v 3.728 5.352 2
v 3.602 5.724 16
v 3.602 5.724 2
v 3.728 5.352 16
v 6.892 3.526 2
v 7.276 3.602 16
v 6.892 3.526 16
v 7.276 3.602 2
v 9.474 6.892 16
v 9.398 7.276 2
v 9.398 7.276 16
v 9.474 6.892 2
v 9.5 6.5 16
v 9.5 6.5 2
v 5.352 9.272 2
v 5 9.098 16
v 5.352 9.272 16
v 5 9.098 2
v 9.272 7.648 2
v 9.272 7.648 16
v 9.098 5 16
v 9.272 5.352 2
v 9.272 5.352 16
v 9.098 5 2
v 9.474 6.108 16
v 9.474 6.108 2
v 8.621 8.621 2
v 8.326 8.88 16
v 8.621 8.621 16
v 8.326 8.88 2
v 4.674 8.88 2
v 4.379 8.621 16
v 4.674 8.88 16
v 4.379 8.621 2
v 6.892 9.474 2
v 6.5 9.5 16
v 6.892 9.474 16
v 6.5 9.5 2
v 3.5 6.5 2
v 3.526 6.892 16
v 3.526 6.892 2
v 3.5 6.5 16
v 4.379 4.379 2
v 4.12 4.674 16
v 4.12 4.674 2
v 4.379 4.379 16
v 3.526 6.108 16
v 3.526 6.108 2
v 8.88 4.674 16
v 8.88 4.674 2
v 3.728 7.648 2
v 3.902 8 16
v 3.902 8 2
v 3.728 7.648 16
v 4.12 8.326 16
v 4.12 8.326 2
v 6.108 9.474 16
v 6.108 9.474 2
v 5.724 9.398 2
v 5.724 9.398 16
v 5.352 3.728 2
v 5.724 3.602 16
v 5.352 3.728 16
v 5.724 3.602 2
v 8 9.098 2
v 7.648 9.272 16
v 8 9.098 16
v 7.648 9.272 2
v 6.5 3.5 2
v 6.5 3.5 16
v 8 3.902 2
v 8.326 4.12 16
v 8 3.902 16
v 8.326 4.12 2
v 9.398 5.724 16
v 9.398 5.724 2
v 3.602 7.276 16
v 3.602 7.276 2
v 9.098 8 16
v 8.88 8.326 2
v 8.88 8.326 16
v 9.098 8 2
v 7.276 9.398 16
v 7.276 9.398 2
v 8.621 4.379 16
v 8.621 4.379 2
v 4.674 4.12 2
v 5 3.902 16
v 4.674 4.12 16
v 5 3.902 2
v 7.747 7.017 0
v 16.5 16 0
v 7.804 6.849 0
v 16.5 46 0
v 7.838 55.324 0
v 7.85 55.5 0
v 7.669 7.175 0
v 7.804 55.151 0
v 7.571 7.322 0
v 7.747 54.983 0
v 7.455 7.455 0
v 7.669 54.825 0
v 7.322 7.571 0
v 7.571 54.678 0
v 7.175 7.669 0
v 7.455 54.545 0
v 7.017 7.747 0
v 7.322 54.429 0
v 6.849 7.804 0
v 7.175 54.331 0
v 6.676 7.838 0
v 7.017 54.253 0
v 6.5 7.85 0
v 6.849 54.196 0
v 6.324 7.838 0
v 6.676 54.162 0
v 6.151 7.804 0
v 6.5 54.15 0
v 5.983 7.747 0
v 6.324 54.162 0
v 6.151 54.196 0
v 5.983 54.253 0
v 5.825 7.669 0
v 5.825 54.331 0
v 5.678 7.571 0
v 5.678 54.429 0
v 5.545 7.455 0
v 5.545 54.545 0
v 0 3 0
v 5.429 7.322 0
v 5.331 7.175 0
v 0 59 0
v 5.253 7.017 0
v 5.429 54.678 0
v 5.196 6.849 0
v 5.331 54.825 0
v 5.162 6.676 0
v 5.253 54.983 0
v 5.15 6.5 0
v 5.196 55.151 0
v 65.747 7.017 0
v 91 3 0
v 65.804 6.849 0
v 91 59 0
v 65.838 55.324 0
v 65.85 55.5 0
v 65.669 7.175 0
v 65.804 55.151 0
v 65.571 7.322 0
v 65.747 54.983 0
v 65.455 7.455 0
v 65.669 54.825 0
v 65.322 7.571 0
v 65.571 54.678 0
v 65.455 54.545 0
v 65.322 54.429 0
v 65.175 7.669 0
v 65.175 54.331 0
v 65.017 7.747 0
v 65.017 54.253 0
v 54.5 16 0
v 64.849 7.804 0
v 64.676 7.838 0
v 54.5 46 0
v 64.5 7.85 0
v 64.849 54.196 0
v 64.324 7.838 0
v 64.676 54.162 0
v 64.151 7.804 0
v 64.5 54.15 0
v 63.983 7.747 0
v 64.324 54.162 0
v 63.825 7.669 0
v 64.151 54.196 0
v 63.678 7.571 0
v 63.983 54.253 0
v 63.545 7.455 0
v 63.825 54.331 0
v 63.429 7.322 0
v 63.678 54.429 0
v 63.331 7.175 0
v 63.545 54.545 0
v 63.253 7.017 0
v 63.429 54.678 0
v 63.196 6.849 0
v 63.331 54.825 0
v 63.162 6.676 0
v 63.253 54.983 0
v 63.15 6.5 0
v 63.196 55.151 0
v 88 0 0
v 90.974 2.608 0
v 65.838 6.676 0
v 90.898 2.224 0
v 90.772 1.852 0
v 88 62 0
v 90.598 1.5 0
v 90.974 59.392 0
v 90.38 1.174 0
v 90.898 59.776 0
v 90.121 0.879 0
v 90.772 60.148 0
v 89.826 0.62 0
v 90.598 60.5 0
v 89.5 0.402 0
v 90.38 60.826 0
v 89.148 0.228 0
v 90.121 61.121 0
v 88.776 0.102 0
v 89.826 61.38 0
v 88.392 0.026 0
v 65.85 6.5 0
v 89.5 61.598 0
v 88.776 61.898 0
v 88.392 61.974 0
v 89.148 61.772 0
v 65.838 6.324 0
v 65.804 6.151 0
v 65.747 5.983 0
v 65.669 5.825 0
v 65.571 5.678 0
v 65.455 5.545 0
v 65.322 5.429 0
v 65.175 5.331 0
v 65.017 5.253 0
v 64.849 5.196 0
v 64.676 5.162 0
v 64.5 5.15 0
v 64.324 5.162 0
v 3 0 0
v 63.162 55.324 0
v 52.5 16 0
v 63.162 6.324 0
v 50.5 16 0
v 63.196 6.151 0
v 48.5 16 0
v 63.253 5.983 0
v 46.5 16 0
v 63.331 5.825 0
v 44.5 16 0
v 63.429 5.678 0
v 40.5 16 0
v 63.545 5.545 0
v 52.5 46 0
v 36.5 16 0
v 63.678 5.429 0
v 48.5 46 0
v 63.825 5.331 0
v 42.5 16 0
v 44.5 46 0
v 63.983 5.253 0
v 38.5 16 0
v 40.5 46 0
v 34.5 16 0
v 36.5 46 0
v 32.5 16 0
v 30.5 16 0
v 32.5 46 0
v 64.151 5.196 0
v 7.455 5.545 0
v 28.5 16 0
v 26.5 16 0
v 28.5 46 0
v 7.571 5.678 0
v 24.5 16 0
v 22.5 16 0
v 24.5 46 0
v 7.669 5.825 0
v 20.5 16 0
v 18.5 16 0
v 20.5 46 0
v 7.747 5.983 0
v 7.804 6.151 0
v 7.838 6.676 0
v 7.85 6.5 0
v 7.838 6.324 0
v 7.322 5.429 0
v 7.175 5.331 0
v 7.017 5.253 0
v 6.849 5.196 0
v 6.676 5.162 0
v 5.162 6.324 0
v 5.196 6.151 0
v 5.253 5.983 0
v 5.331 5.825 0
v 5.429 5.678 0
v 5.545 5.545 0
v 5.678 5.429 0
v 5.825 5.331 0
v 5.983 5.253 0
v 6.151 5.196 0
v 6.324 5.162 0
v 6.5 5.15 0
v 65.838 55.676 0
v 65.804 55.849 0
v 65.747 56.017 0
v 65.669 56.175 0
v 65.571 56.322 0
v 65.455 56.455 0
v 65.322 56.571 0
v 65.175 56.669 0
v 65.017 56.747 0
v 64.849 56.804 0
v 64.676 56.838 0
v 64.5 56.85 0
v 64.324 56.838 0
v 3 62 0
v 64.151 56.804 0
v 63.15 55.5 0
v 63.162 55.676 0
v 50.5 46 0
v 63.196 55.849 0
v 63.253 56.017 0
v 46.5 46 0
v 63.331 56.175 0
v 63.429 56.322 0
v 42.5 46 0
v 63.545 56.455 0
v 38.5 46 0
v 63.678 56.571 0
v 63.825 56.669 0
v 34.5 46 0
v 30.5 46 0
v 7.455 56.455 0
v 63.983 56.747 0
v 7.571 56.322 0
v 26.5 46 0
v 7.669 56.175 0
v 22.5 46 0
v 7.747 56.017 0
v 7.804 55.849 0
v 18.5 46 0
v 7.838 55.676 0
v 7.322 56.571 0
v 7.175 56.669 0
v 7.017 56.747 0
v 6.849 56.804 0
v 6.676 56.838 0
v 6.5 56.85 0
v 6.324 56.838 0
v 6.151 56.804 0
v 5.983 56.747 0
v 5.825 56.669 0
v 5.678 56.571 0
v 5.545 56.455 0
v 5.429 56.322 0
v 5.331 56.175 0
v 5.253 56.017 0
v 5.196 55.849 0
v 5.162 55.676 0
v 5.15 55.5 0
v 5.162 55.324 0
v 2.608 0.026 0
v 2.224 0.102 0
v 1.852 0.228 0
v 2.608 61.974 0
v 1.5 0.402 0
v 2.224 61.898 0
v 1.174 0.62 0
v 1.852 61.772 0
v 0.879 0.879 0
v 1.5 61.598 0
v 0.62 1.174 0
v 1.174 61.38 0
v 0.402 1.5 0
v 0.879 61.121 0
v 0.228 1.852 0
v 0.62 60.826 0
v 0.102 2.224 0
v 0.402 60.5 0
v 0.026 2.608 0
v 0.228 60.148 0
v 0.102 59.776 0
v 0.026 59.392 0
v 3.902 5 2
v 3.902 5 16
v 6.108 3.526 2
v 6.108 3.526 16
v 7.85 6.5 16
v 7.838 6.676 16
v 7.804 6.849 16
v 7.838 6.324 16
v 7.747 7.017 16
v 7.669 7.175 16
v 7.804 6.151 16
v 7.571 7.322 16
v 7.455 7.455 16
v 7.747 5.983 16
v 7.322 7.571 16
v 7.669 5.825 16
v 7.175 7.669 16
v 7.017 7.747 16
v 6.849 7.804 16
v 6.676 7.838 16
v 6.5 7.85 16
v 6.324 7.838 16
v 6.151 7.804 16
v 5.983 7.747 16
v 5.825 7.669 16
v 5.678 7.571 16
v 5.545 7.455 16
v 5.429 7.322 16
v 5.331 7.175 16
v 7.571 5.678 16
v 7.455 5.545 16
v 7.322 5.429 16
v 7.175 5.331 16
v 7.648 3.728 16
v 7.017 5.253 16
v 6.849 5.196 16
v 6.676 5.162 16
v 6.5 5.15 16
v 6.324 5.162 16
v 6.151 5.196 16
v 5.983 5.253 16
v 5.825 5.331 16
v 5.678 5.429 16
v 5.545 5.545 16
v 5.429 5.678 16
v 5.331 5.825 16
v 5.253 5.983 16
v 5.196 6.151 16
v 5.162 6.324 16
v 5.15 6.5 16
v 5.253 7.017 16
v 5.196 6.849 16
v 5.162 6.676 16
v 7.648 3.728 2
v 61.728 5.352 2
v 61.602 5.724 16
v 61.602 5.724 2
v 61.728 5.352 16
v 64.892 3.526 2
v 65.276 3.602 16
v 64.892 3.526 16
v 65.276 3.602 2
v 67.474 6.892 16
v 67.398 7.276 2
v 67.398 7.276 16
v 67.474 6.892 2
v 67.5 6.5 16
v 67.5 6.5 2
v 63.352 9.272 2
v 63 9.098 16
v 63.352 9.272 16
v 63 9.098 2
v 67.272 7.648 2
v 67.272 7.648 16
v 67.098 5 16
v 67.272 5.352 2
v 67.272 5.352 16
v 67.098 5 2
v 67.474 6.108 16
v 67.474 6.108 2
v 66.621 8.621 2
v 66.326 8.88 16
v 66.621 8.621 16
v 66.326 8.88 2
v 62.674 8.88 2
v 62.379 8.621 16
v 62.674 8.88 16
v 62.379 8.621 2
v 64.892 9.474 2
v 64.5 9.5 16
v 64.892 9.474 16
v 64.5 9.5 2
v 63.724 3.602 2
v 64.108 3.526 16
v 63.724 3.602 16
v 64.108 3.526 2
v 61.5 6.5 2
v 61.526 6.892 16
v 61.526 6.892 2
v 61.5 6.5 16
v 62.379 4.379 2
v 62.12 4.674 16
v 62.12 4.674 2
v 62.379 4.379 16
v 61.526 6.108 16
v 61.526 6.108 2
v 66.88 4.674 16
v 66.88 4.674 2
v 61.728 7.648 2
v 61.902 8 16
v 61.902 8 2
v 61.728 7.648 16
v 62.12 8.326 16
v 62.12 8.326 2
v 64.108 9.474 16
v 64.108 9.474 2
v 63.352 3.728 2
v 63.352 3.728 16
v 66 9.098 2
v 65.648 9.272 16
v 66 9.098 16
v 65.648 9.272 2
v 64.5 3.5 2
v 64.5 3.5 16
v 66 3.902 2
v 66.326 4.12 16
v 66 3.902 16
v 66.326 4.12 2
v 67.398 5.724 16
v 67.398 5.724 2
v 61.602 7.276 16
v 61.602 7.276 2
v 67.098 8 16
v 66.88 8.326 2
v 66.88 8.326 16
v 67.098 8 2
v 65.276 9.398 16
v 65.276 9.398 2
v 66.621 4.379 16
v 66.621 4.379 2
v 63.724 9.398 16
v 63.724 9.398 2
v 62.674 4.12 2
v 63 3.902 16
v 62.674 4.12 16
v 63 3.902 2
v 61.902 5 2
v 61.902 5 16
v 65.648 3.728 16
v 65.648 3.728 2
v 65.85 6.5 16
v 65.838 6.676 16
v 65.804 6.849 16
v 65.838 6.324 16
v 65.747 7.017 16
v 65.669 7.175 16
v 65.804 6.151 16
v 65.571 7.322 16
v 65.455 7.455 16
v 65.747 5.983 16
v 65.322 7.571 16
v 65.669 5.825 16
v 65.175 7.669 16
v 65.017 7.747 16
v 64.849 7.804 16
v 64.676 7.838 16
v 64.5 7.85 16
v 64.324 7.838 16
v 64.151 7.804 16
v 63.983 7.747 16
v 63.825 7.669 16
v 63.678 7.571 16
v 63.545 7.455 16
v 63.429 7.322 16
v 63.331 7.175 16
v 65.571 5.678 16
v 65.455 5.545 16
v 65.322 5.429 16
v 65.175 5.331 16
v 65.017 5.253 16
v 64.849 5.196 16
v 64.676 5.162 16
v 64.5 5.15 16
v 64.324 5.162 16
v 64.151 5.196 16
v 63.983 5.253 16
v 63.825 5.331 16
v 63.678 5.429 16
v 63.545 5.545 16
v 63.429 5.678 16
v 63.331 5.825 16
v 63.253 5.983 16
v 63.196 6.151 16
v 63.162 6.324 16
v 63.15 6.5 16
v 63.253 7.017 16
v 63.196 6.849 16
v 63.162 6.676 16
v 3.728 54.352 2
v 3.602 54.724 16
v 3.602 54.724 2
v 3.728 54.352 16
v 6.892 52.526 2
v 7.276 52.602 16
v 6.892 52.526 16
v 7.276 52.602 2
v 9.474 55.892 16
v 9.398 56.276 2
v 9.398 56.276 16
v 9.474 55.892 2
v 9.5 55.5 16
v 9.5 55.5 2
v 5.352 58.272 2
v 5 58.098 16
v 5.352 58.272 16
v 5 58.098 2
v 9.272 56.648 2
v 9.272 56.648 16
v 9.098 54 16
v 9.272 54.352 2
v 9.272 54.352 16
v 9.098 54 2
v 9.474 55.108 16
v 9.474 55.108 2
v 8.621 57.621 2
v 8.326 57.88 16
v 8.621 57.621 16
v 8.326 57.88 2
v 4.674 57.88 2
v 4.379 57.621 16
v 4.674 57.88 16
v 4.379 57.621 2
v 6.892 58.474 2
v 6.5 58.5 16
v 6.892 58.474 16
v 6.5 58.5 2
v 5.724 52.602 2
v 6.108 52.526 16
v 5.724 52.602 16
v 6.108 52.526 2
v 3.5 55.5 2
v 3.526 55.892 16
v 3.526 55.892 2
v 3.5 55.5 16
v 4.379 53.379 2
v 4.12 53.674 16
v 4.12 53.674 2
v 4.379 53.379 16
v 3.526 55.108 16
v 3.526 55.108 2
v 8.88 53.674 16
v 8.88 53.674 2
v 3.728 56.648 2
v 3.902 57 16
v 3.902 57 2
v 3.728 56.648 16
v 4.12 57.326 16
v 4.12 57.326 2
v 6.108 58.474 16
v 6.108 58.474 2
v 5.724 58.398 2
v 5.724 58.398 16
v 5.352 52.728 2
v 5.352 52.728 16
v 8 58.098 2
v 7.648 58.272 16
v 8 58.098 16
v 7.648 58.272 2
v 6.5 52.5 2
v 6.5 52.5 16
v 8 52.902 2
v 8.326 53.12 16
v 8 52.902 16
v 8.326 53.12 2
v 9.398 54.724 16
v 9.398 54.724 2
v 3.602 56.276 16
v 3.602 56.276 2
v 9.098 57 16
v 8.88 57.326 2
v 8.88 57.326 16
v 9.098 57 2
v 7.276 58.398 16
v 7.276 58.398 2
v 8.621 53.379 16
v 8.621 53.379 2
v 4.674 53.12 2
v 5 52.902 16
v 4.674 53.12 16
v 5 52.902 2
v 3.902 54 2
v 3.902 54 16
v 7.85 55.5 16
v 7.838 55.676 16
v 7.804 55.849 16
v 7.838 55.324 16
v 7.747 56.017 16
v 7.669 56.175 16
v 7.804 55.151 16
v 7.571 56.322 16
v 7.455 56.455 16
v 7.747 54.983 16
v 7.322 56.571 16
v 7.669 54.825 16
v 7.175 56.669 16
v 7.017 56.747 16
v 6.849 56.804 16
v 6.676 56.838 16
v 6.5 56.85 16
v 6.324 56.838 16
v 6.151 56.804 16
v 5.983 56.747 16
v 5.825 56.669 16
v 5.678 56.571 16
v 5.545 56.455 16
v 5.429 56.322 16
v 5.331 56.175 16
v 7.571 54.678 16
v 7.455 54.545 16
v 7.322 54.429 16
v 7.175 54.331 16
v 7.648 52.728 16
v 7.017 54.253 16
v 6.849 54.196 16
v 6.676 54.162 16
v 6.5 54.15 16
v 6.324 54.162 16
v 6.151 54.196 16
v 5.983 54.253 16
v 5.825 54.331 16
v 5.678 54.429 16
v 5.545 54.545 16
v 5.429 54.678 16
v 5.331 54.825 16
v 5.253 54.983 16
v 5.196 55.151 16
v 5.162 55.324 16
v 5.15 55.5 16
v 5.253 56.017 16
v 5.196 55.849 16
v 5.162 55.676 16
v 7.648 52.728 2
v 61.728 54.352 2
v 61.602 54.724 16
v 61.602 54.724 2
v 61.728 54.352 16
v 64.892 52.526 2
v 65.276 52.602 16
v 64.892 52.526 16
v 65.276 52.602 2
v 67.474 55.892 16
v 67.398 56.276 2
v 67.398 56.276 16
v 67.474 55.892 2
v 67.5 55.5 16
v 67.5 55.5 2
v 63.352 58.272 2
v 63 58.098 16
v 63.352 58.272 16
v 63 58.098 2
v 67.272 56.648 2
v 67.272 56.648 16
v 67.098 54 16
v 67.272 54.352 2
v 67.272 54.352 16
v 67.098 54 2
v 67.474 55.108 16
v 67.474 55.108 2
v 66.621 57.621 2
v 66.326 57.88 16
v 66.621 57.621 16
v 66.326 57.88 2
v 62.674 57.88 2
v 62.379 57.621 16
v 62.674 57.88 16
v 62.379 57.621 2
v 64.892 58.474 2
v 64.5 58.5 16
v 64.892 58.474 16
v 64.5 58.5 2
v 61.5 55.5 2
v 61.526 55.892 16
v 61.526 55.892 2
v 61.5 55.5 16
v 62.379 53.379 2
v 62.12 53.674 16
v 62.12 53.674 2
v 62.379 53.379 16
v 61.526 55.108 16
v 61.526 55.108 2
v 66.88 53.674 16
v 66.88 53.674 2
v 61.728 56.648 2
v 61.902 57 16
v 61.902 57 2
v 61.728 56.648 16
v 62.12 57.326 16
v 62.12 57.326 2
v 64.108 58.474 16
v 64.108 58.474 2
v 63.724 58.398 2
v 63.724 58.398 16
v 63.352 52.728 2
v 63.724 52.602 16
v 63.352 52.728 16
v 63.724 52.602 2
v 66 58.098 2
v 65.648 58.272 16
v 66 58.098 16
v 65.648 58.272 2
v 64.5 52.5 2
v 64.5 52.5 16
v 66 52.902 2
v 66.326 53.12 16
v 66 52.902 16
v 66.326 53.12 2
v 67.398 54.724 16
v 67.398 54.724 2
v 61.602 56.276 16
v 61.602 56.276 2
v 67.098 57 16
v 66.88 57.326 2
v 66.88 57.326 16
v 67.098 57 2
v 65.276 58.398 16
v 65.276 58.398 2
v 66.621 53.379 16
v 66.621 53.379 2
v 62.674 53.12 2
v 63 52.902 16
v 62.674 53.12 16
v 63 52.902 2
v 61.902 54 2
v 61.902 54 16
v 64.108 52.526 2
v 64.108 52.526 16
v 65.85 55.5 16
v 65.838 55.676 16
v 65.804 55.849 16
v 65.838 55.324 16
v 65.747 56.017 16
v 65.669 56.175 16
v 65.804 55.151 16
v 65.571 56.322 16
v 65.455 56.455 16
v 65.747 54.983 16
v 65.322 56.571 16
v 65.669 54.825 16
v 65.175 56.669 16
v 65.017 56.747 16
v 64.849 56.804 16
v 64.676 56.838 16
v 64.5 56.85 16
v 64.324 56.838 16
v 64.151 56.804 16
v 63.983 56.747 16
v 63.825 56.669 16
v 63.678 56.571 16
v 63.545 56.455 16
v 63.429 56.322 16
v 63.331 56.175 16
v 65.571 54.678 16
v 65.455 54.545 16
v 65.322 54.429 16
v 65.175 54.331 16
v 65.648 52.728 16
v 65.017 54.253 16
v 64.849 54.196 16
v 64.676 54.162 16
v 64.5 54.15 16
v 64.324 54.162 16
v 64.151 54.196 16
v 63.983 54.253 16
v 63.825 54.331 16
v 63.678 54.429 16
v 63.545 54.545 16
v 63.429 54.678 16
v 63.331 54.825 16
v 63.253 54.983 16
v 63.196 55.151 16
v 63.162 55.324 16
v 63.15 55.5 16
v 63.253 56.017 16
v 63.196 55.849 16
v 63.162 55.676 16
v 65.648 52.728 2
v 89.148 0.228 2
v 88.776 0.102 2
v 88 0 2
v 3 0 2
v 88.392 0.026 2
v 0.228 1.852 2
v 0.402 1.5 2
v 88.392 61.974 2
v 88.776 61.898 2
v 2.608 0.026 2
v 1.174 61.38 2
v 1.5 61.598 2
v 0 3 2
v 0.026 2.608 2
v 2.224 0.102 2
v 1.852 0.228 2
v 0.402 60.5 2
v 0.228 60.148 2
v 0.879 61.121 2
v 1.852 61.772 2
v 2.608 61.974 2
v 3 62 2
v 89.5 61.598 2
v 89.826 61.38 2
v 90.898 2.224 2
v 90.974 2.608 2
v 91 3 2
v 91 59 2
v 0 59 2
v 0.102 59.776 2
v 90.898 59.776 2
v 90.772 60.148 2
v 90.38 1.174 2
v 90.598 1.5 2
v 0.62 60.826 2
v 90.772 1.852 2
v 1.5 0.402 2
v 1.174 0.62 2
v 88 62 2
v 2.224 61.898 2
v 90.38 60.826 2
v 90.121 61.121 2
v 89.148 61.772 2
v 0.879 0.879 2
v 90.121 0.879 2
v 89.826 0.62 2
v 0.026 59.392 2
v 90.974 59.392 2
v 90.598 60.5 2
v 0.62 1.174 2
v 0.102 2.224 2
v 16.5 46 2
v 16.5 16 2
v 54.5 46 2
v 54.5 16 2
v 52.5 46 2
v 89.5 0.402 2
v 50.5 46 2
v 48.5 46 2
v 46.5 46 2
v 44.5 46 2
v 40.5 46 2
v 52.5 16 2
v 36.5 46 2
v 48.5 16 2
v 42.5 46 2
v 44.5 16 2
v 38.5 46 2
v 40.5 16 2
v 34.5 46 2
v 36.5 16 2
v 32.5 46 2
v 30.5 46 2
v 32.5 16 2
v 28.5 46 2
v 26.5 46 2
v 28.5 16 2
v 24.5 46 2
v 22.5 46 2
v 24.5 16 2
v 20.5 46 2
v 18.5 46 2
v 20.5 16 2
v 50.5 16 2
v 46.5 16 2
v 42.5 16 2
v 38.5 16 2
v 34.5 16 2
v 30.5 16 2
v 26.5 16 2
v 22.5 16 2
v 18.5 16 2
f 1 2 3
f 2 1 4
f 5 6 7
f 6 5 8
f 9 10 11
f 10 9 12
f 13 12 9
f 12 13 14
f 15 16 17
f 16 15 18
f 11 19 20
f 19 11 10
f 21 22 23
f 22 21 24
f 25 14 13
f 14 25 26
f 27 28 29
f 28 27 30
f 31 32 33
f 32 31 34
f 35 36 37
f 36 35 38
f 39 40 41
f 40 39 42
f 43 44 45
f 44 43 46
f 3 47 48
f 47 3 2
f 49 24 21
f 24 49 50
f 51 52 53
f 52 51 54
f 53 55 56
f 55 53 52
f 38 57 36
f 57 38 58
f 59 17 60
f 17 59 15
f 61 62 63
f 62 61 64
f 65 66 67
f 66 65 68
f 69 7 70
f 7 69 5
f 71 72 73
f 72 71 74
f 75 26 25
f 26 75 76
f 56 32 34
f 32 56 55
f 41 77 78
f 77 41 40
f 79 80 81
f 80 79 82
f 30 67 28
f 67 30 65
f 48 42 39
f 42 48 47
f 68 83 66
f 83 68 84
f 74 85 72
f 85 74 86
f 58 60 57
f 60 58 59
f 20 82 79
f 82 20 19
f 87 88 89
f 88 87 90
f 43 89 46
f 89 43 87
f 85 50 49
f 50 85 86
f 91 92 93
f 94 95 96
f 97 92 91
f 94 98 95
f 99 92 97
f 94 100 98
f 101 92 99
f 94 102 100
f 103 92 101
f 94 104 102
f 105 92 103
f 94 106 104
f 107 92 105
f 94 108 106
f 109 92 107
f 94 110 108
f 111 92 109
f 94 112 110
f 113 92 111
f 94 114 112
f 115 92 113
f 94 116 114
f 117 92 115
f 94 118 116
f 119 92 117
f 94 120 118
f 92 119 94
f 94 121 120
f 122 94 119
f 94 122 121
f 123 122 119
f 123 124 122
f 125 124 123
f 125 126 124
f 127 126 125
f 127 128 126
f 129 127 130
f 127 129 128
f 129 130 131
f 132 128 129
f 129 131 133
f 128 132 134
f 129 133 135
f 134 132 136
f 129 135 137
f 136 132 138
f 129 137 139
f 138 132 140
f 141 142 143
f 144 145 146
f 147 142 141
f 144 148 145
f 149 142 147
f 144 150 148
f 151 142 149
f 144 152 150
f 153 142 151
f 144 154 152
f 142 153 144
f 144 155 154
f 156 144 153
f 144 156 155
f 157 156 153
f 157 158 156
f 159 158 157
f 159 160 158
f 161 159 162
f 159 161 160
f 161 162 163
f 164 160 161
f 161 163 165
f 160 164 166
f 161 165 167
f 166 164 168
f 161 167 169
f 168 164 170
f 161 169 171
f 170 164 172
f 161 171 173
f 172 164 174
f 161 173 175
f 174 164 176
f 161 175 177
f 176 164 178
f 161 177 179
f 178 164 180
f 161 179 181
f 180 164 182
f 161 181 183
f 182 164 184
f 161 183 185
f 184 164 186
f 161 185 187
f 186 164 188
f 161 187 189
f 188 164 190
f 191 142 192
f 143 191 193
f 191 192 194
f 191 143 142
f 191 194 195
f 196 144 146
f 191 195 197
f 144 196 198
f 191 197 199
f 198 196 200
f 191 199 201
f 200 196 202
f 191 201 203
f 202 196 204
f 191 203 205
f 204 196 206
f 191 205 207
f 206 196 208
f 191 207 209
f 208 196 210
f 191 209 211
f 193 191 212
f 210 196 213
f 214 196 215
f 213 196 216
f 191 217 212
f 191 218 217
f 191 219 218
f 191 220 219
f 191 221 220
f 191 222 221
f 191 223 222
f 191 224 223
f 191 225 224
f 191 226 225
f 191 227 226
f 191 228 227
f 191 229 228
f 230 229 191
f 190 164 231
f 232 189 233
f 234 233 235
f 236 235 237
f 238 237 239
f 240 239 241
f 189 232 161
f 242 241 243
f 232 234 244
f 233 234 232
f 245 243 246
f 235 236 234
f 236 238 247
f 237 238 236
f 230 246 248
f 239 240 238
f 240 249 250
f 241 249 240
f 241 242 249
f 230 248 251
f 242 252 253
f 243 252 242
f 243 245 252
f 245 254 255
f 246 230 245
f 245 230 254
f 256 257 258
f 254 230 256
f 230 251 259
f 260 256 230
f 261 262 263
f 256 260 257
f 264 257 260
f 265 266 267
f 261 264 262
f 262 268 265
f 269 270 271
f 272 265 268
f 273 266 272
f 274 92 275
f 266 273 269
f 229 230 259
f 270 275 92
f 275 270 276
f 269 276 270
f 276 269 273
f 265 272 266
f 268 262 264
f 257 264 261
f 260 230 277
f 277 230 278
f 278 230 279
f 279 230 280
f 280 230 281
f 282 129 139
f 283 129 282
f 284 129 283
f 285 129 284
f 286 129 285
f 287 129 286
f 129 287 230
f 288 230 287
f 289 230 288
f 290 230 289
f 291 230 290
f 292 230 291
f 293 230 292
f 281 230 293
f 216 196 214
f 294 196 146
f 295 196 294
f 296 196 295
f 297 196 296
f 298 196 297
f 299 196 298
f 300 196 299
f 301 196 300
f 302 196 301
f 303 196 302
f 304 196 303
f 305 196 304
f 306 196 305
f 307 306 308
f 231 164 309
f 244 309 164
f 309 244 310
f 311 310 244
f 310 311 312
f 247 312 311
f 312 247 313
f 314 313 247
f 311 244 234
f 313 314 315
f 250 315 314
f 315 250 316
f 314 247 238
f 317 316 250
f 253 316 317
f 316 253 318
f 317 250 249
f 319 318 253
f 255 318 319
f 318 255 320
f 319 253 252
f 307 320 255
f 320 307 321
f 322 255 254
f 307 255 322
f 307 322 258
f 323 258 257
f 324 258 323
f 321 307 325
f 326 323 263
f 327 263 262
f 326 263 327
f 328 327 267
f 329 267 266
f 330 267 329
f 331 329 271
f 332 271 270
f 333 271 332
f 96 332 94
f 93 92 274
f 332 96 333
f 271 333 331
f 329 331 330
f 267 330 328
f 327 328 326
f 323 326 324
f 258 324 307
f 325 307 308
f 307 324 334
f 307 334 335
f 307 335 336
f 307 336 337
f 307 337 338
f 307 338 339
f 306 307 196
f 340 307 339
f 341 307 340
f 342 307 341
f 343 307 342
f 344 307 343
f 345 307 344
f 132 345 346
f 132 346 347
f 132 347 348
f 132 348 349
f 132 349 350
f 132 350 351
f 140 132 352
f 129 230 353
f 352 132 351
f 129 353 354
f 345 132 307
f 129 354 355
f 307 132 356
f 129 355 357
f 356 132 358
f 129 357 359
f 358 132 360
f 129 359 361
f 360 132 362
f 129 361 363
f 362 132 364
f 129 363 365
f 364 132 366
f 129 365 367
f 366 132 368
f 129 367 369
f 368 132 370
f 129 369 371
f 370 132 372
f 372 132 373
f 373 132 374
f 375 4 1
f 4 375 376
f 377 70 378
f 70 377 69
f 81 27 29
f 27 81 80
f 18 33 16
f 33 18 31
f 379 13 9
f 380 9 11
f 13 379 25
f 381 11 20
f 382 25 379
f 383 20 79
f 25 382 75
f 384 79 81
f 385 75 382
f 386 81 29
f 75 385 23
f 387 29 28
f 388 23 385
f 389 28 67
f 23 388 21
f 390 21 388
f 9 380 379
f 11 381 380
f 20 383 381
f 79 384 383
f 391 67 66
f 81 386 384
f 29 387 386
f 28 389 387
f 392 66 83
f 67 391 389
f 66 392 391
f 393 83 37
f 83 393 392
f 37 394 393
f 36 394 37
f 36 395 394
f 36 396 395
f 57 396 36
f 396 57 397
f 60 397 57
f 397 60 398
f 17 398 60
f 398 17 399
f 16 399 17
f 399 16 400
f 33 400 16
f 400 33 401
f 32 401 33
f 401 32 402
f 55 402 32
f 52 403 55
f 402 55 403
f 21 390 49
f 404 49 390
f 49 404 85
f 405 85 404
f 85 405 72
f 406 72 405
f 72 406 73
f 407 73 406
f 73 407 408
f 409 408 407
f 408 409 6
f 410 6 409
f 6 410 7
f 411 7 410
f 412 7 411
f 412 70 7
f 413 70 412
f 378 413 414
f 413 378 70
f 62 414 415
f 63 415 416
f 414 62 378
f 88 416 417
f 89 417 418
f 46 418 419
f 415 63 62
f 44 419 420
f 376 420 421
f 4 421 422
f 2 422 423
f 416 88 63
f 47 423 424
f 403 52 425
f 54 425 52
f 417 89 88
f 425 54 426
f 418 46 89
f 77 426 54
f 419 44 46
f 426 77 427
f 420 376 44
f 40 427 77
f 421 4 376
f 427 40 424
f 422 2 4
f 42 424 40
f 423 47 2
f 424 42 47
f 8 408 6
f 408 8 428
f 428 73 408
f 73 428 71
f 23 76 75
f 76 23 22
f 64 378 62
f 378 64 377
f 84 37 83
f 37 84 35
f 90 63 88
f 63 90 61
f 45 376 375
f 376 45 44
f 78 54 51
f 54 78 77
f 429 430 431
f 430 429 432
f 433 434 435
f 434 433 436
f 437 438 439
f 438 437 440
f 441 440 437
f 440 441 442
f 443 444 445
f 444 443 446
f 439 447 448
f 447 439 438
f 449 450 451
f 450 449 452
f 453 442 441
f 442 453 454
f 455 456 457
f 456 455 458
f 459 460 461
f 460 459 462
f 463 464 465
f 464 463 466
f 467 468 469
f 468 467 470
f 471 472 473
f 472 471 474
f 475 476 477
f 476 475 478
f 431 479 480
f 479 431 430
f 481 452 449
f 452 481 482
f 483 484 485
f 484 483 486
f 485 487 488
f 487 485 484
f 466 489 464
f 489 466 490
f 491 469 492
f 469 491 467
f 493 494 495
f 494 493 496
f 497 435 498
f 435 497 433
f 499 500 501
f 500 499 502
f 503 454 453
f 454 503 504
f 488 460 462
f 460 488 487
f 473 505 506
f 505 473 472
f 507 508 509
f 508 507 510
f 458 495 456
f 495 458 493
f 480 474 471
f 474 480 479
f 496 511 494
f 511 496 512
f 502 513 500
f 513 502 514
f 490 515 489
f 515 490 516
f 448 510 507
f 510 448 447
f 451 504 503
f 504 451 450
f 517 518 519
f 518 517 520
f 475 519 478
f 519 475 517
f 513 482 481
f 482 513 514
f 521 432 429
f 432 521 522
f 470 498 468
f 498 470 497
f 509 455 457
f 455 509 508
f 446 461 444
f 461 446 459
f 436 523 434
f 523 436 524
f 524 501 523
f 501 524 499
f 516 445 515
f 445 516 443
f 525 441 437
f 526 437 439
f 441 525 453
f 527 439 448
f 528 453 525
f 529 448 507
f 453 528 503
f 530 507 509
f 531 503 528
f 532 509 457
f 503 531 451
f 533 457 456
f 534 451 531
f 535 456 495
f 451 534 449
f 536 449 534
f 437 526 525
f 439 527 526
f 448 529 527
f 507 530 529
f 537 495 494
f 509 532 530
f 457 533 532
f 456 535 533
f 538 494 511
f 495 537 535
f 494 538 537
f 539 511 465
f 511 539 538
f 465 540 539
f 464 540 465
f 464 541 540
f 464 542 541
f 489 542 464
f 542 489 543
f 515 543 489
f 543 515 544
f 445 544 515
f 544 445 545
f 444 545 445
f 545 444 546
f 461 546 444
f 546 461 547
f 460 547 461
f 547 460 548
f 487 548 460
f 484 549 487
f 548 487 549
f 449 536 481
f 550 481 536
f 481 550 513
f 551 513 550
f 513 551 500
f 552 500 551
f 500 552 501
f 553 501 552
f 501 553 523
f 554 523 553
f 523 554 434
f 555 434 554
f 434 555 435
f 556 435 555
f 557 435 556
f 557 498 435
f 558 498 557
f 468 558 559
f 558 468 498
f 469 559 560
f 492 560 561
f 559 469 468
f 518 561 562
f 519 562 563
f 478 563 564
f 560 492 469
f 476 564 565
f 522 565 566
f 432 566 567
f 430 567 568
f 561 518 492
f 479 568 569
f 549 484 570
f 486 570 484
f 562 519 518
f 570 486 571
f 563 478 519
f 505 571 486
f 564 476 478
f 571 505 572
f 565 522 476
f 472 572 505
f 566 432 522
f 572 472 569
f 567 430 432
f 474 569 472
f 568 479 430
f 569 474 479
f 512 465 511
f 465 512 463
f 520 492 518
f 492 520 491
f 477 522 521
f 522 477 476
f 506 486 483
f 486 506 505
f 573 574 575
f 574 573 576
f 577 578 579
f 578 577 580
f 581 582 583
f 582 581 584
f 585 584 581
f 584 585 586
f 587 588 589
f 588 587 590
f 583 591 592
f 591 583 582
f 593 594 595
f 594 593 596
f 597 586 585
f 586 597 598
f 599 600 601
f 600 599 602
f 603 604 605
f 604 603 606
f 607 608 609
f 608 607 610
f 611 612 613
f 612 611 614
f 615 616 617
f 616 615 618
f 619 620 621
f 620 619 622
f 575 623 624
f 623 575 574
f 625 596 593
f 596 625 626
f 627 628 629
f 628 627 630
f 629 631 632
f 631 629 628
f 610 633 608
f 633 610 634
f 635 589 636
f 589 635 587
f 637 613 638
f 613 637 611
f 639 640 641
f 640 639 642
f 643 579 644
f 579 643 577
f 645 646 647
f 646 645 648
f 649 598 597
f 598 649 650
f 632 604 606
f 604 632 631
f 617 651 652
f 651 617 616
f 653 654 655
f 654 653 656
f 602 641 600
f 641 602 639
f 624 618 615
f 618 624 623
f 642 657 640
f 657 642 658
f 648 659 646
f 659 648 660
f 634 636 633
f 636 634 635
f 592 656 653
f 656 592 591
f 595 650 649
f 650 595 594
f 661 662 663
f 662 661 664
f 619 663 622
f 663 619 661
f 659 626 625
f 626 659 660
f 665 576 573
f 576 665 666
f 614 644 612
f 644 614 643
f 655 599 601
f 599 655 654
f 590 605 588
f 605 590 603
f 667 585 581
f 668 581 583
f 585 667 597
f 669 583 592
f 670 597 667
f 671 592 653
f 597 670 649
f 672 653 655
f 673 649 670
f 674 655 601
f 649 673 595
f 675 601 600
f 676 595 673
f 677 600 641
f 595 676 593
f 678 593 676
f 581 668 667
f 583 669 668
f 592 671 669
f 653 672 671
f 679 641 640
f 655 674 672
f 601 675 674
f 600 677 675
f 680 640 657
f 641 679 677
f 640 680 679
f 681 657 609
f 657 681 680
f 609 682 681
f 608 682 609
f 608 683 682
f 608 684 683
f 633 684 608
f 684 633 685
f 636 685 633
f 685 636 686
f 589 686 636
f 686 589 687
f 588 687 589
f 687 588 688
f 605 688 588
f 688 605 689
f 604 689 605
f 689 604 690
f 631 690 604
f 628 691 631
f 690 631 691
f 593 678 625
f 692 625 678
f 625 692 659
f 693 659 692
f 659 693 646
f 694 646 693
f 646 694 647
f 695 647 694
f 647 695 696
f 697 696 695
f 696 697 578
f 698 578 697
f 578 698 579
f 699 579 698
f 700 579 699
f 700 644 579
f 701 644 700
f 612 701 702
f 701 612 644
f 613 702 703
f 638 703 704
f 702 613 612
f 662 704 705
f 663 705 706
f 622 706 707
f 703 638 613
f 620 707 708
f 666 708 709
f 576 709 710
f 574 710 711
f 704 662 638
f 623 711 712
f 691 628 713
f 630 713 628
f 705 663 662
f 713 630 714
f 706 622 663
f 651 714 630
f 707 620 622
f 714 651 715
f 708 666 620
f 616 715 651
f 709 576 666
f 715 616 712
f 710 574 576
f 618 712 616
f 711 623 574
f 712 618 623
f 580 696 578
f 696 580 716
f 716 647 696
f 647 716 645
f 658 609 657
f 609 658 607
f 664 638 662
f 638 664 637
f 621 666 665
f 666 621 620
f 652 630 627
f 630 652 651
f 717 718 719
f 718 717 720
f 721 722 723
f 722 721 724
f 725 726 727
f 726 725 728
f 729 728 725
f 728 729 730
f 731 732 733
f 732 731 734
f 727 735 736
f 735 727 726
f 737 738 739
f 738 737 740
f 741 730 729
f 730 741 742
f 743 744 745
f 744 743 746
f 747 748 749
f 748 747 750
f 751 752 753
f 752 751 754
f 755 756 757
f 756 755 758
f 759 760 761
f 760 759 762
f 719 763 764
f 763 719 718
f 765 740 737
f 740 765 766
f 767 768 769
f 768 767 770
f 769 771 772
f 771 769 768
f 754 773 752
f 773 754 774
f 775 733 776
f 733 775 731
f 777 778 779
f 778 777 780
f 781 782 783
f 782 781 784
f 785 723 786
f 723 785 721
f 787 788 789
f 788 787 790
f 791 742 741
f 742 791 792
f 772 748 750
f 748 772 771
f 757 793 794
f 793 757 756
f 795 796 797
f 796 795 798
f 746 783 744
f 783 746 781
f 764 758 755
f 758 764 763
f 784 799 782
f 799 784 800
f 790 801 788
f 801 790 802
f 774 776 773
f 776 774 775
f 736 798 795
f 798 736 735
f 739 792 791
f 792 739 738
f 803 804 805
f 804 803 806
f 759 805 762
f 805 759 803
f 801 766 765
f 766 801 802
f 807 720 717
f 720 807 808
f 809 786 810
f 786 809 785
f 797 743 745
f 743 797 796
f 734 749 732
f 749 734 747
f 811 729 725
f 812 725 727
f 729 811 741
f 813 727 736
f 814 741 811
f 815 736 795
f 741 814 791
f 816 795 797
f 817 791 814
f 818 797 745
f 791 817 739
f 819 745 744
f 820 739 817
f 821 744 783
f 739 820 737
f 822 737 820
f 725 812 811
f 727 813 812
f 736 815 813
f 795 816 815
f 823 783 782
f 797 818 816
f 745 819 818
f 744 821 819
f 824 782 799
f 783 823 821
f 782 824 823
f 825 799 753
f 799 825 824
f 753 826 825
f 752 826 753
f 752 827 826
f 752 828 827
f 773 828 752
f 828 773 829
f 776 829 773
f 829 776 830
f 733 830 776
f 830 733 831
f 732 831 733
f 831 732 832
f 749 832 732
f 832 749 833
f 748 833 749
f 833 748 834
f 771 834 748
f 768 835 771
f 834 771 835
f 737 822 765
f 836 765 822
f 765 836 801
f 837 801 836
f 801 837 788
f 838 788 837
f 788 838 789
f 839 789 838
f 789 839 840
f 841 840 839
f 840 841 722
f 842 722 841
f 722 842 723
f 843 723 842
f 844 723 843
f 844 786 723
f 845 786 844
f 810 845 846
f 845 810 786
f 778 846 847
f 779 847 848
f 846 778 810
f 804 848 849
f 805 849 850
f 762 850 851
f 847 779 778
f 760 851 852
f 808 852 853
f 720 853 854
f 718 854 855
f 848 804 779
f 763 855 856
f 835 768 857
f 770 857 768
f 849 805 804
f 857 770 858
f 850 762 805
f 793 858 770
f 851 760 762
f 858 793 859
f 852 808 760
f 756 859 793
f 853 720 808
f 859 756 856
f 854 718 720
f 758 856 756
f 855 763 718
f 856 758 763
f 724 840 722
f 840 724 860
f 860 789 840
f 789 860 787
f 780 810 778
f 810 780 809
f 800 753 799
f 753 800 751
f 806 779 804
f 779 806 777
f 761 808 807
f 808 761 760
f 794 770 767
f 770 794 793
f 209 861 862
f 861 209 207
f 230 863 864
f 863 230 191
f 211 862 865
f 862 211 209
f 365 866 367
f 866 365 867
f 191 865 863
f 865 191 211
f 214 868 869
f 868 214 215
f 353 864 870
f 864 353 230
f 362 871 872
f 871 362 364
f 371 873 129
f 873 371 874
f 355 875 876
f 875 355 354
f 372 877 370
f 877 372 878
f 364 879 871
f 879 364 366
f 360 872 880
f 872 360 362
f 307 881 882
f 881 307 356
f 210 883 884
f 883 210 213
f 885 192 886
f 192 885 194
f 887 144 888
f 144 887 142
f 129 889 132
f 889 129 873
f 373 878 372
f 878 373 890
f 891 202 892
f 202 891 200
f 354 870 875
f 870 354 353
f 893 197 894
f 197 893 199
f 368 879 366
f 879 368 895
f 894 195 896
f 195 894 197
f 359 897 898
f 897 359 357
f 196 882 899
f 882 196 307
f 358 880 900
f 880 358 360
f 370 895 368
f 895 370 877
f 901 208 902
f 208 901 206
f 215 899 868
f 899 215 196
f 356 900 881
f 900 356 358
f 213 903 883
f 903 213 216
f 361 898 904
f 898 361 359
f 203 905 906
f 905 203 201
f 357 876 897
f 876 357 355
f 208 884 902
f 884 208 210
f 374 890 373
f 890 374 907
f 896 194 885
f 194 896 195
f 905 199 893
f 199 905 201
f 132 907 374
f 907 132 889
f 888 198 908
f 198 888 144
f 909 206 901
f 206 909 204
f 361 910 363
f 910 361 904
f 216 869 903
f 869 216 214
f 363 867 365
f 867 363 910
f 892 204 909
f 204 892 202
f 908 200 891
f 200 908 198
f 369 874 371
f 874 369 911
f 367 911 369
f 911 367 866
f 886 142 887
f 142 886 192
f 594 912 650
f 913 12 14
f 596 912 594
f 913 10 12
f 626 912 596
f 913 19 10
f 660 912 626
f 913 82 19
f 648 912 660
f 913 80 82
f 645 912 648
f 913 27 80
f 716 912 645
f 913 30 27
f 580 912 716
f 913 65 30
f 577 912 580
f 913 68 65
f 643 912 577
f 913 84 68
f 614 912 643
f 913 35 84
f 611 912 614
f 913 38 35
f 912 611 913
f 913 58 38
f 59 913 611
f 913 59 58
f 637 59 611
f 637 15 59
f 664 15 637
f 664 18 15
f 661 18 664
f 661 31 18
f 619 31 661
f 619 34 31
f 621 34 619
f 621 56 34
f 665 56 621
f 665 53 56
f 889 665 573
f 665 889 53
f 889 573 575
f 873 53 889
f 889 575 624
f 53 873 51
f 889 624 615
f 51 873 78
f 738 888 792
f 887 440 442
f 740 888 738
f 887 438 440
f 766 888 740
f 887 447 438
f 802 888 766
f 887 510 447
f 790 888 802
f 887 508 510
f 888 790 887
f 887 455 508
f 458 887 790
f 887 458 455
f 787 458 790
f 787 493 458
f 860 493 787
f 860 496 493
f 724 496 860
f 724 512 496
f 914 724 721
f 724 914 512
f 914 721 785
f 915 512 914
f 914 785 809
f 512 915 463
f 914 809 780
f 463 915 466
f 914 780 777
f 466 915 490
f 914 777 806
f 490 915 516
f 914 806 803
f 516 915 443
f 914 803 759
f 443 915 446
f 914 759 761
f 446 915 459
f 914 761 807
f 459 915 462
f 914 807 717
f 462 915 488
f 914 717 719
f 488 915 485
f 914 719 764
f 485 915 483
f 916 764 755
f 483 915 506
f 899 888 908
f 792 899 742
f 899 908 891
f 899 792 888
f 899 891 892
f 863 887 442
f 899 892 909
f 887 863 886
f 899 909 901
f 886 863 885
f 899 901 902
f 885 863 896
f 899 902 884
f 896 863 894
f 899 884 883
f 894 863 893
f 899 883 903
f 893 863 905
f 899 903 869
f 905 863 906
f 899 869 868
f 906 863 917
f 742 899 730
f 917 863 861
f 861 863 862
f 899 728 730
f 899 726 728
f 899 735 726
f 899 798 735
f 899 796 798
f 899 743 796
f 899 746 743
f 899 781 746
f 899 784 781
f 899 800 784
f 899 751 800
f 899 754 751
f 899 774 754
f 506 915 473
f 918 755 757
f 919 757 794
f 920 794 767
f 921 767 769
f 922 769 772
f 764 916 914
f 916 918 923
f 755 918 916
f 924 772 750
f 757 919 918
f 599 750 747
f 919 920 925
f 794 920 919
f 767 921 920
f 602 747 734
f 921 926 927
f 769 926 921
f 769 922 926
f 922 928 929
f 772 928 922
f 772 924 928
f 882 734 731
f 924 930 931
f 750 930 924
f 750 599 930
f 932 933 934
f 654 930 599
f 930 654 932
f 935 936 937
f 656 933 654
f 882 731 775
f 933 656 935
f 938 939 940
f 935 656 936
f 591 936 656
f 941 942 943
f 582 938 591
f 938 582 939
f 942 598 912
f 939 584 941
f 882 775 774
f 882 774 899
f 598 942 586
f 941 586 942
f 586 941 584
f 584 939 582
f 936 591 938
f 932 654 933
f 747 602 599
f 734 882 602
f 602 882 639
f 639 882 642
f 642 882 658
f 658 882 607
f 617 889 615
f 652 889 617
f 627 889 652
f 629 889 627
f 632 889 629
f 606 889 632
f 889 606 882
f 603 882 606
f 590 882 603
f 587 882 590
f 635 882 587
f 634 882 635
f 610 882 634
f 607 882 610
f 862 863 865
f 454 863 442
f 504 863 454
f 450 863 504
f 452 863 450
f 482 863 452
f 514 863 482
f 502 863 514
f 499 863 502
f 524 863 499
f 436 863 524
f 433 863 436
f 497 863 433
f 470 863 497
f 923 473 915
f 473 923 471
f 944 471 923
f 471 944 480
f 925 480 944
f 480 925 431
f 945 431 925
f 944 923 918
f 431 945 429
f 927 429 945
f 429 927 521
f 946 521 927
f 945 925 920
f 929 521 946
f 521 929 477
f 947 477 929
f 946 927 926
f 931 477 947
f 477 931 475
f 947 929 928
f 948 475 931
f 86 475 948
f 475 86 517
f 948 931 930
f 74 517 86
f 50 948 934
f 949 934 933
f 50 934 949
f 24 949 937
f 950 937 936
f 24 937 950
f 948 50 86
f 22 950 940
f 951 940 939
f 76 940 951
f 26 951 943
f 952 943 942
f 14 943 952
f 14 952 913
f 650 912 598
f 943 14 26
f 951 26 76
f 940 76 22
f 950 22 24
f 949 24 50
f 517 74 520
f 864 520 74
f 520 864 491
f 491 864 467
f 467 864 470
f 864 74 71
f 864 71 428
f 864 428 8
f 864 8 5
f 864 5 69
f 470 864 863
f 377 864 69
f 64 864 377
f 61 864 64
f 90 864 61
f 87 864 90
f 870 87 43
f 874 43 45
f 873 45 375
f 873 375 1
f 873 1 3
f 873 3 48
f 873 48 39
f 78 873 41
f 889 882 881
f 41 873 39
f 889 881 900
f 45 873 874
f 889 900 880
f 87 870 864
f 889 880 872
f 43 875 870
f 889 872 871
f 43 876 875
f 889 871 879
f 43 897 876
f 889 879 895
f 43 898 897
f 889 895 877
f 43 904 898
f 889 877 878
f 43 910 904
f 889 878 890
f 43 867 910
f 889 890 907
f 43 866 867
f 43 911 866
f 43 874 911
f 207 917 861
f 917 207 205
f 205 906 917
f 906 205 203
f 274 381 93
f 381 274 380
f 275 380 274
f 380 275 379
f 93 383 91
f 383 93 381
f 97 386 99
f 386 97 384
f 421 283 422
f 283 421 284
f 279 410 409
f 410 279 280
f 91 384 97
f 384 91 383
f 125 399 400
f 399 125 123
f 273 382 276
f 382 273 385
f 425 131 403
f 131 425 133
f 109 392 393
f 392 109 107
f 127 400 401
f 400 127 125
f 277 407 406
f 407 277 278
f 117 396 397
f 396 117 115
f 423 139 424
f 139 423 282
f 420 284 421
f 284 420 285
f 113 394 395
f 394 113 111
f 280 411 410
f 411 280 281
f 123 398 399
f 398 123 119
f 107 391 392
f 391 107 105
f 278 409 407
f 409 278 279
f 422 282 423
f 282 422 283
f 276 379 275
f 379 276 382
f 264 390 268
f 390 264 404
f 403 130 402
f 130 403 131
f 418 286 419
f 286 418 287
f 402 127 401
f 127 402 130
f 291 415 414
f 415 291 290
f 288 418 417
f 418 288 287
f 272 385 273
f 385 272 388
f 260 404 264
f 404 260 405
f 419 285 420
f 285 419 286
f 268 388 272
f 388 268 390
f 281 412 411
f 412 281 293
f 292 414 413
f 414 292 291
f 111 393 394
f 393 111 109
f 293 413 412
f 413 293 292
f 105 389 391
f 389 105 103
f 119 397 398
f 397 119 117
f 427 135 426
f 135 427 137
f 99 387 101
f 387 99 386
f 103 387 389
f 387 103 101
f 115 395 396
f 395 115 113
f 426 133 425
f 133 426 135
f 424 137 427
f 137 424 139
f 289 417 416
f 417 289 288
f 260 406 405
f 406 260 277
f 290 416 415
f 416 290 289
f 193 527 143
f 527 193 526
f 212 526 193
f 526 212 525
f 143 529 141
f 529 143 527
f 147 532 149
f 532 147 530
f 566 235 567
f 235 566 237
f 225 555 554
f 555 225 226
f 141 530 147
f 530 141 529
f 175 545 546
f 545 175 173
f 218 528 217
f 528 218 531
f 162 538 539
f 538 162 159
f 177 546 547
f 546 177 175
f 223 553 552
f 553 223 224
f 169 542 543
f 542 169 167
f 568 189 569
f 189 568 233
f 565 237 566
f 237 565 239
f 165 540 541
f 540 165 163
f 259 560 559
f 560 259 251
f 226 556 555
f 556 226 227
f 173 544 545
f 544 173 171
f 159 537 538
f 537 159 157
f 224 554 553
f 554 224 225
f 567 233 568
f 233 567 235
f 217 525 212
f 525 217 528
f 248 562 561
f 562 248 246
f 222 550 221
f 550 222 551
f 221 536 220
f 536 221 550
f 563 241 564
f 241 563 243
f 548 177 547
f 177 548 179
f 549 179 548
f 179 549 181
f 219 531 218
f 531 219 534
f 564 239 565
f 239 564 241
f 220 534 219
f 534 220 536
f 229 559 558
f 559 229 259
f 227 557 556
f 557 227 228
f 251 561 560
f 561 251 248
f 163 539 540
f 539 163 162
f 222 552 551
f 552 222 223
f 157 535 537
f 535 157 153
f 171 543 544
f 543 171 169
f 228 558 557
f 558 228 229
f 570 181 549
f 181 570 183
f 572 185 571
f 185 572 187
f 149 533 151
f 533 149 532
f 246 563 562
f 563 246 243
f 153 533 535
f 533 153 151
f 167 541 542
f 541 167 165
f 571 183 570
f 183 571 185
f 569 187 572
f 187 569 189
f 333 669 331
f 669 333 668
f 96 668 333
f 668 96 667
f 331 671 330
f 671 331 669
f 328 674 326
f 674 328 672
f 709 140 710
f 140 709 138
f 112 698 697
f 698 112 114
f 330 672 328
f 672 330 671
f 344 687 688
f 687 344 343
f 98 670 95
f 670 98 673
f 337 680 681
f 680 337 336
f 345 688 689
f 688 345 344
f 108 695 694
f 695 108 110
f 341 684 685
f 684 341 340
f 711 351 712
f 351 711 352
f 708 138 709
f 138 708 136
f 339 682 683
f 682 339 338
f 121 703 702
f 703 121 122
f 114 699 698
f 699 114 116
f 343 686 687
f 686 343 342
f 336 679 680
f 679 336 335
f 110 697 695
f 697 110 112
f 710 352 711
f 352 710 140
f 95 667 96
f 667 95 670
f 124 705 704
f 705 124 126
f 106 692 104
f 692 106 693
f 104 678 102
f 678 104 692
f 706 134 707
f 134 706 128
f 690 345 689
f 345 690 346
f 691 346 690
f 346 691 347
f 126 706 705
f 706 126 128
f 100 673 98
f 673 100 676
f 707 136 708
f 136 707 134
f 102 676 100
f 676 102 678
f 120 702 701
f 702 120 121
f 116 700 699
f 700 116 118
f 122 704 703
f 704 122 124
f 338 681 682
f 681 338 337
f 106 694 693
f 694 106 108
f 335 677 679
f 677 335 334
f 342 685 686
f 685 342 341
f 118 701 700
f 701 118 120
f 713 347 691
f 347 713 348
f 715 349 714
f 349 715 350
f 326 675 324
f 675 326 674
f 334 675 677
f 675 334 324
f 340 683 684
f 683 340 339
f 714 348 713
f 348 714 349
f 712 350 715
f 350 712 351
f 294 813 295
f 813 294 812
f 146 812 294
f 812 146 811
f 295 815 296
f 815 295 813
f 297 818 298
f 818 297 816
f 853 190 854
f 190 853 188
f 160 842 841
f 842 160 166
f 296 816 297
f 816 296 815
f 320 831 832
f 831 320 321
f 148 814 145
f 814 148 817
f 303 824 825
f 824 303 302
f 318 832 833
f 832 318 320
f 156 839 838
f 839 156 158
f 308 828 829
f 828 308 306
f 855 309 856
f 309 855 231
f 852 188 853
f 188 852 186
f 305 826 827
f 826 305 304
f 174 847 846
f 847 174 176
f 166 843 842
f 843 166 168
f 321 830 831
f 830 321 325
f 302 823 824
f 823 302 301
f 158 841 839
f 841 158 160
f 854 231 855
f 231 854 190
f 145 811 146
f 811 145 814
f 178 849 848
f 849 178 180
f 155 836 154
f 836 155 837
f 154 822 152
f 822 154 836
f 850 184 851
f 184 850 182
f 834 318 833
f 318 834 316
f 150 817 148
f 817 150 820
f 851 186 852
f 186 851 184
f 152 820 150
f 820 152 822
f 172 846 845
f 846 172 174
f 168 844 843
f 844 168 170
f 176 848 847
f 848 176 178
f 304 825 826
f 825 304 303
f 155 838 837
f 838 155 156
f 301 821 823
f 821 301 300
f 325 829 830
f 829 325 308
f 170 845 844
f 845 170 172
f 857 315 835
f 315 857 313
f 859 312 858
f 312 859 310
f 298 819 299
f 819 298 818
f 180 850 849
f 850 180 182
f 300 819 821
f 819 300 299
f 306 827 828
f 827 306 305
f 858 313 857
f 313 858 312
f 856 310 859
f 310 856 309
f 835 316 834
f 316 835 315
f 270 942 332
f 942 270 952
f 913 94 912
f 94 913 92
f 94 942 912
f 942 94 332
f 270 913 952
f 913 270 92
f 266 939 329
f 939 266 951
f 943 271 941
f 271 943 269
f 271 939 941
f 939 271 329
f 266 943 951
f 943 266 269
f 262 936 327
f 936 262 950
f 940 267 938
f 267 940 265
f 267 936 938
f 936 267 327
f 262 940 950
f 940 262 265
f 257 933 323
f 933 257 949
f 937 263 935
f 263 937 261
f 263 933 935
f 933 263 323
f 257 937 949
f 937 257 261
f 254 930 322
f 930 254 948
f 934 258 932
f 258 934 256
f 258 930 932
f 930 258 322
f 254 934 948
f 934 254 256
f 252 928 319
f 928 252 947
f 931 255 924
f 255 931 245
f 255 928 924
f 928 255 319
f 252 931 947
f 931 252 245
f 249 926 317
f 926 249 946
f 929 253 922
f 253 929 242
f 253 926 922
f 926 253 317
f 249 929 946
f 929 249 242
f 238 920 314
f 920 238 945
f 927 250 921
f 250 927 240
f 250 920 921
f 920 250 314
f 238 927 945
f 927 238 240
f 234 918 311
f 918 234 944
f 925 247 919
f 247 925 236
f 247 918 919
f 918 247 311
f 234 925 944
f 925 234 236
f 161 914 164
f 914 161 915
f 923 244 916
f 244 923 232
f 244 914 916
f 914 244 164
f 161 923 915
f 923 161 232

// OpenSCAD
// Top lid for a Raspberry Pi 5: screws to the board's four M2.5 mounting holes
// (58 x 49 mm apart) on 14 mm standoffs, vent grille over the cooler.
// 2 mm top plate, 3 mm past the 85 x 56 mm board on every side.
// Printed upside down: plate on the bed, standoffs up.
board = [85, 56];
holes = [[3.5, 3.5], [61.5, 3.5], [3.5, 52.5], [61.5, 52.5]];   // from the board corner
over = 3;
plate_t = 2;
standoff_h = 14;
standoff_d = 6;
screw_d = 2.7;          // M2.5 clearance
corner_r = 3;
vent = [40, 30];        // grille area
slot_w = 2;
slot_pitch = 4;
$fn = 48;

plate = board + [2 * over, 2 * over];
center = [(holes[0][0] + holes[1][0]) / 2, (holes[0][1] + holes[2][1]) / 2];

translate([over, over, 0])
difference() {
    union() {
        translate([-over, -over, 0])
            linear_extrude(plate_t) offset(corner_r) offset(delta = -corner_r) square(plate);
        for (h = holes) translate([h[0], h[1], 0]) cylinder(d = standoff_d, h = plate_t + standoff_h);
    }
    for (h = holes) translate([h[0], h[1], -1]) cylinder(d = screw_d, h = plate_t + standoff_h + 2);
    // vent slots
    n = floor(vent[0] / slot_pitch);
    for (i = [0:n - 1])
        translate([center[0] - vent[0] / 2 + slot_pitch / 2 + i * slot_pitch - slot_w / 2, center[1] - vent[1] / 2, -1])
            cube([slot_w, vent[1], plate_t + 2]);
}
